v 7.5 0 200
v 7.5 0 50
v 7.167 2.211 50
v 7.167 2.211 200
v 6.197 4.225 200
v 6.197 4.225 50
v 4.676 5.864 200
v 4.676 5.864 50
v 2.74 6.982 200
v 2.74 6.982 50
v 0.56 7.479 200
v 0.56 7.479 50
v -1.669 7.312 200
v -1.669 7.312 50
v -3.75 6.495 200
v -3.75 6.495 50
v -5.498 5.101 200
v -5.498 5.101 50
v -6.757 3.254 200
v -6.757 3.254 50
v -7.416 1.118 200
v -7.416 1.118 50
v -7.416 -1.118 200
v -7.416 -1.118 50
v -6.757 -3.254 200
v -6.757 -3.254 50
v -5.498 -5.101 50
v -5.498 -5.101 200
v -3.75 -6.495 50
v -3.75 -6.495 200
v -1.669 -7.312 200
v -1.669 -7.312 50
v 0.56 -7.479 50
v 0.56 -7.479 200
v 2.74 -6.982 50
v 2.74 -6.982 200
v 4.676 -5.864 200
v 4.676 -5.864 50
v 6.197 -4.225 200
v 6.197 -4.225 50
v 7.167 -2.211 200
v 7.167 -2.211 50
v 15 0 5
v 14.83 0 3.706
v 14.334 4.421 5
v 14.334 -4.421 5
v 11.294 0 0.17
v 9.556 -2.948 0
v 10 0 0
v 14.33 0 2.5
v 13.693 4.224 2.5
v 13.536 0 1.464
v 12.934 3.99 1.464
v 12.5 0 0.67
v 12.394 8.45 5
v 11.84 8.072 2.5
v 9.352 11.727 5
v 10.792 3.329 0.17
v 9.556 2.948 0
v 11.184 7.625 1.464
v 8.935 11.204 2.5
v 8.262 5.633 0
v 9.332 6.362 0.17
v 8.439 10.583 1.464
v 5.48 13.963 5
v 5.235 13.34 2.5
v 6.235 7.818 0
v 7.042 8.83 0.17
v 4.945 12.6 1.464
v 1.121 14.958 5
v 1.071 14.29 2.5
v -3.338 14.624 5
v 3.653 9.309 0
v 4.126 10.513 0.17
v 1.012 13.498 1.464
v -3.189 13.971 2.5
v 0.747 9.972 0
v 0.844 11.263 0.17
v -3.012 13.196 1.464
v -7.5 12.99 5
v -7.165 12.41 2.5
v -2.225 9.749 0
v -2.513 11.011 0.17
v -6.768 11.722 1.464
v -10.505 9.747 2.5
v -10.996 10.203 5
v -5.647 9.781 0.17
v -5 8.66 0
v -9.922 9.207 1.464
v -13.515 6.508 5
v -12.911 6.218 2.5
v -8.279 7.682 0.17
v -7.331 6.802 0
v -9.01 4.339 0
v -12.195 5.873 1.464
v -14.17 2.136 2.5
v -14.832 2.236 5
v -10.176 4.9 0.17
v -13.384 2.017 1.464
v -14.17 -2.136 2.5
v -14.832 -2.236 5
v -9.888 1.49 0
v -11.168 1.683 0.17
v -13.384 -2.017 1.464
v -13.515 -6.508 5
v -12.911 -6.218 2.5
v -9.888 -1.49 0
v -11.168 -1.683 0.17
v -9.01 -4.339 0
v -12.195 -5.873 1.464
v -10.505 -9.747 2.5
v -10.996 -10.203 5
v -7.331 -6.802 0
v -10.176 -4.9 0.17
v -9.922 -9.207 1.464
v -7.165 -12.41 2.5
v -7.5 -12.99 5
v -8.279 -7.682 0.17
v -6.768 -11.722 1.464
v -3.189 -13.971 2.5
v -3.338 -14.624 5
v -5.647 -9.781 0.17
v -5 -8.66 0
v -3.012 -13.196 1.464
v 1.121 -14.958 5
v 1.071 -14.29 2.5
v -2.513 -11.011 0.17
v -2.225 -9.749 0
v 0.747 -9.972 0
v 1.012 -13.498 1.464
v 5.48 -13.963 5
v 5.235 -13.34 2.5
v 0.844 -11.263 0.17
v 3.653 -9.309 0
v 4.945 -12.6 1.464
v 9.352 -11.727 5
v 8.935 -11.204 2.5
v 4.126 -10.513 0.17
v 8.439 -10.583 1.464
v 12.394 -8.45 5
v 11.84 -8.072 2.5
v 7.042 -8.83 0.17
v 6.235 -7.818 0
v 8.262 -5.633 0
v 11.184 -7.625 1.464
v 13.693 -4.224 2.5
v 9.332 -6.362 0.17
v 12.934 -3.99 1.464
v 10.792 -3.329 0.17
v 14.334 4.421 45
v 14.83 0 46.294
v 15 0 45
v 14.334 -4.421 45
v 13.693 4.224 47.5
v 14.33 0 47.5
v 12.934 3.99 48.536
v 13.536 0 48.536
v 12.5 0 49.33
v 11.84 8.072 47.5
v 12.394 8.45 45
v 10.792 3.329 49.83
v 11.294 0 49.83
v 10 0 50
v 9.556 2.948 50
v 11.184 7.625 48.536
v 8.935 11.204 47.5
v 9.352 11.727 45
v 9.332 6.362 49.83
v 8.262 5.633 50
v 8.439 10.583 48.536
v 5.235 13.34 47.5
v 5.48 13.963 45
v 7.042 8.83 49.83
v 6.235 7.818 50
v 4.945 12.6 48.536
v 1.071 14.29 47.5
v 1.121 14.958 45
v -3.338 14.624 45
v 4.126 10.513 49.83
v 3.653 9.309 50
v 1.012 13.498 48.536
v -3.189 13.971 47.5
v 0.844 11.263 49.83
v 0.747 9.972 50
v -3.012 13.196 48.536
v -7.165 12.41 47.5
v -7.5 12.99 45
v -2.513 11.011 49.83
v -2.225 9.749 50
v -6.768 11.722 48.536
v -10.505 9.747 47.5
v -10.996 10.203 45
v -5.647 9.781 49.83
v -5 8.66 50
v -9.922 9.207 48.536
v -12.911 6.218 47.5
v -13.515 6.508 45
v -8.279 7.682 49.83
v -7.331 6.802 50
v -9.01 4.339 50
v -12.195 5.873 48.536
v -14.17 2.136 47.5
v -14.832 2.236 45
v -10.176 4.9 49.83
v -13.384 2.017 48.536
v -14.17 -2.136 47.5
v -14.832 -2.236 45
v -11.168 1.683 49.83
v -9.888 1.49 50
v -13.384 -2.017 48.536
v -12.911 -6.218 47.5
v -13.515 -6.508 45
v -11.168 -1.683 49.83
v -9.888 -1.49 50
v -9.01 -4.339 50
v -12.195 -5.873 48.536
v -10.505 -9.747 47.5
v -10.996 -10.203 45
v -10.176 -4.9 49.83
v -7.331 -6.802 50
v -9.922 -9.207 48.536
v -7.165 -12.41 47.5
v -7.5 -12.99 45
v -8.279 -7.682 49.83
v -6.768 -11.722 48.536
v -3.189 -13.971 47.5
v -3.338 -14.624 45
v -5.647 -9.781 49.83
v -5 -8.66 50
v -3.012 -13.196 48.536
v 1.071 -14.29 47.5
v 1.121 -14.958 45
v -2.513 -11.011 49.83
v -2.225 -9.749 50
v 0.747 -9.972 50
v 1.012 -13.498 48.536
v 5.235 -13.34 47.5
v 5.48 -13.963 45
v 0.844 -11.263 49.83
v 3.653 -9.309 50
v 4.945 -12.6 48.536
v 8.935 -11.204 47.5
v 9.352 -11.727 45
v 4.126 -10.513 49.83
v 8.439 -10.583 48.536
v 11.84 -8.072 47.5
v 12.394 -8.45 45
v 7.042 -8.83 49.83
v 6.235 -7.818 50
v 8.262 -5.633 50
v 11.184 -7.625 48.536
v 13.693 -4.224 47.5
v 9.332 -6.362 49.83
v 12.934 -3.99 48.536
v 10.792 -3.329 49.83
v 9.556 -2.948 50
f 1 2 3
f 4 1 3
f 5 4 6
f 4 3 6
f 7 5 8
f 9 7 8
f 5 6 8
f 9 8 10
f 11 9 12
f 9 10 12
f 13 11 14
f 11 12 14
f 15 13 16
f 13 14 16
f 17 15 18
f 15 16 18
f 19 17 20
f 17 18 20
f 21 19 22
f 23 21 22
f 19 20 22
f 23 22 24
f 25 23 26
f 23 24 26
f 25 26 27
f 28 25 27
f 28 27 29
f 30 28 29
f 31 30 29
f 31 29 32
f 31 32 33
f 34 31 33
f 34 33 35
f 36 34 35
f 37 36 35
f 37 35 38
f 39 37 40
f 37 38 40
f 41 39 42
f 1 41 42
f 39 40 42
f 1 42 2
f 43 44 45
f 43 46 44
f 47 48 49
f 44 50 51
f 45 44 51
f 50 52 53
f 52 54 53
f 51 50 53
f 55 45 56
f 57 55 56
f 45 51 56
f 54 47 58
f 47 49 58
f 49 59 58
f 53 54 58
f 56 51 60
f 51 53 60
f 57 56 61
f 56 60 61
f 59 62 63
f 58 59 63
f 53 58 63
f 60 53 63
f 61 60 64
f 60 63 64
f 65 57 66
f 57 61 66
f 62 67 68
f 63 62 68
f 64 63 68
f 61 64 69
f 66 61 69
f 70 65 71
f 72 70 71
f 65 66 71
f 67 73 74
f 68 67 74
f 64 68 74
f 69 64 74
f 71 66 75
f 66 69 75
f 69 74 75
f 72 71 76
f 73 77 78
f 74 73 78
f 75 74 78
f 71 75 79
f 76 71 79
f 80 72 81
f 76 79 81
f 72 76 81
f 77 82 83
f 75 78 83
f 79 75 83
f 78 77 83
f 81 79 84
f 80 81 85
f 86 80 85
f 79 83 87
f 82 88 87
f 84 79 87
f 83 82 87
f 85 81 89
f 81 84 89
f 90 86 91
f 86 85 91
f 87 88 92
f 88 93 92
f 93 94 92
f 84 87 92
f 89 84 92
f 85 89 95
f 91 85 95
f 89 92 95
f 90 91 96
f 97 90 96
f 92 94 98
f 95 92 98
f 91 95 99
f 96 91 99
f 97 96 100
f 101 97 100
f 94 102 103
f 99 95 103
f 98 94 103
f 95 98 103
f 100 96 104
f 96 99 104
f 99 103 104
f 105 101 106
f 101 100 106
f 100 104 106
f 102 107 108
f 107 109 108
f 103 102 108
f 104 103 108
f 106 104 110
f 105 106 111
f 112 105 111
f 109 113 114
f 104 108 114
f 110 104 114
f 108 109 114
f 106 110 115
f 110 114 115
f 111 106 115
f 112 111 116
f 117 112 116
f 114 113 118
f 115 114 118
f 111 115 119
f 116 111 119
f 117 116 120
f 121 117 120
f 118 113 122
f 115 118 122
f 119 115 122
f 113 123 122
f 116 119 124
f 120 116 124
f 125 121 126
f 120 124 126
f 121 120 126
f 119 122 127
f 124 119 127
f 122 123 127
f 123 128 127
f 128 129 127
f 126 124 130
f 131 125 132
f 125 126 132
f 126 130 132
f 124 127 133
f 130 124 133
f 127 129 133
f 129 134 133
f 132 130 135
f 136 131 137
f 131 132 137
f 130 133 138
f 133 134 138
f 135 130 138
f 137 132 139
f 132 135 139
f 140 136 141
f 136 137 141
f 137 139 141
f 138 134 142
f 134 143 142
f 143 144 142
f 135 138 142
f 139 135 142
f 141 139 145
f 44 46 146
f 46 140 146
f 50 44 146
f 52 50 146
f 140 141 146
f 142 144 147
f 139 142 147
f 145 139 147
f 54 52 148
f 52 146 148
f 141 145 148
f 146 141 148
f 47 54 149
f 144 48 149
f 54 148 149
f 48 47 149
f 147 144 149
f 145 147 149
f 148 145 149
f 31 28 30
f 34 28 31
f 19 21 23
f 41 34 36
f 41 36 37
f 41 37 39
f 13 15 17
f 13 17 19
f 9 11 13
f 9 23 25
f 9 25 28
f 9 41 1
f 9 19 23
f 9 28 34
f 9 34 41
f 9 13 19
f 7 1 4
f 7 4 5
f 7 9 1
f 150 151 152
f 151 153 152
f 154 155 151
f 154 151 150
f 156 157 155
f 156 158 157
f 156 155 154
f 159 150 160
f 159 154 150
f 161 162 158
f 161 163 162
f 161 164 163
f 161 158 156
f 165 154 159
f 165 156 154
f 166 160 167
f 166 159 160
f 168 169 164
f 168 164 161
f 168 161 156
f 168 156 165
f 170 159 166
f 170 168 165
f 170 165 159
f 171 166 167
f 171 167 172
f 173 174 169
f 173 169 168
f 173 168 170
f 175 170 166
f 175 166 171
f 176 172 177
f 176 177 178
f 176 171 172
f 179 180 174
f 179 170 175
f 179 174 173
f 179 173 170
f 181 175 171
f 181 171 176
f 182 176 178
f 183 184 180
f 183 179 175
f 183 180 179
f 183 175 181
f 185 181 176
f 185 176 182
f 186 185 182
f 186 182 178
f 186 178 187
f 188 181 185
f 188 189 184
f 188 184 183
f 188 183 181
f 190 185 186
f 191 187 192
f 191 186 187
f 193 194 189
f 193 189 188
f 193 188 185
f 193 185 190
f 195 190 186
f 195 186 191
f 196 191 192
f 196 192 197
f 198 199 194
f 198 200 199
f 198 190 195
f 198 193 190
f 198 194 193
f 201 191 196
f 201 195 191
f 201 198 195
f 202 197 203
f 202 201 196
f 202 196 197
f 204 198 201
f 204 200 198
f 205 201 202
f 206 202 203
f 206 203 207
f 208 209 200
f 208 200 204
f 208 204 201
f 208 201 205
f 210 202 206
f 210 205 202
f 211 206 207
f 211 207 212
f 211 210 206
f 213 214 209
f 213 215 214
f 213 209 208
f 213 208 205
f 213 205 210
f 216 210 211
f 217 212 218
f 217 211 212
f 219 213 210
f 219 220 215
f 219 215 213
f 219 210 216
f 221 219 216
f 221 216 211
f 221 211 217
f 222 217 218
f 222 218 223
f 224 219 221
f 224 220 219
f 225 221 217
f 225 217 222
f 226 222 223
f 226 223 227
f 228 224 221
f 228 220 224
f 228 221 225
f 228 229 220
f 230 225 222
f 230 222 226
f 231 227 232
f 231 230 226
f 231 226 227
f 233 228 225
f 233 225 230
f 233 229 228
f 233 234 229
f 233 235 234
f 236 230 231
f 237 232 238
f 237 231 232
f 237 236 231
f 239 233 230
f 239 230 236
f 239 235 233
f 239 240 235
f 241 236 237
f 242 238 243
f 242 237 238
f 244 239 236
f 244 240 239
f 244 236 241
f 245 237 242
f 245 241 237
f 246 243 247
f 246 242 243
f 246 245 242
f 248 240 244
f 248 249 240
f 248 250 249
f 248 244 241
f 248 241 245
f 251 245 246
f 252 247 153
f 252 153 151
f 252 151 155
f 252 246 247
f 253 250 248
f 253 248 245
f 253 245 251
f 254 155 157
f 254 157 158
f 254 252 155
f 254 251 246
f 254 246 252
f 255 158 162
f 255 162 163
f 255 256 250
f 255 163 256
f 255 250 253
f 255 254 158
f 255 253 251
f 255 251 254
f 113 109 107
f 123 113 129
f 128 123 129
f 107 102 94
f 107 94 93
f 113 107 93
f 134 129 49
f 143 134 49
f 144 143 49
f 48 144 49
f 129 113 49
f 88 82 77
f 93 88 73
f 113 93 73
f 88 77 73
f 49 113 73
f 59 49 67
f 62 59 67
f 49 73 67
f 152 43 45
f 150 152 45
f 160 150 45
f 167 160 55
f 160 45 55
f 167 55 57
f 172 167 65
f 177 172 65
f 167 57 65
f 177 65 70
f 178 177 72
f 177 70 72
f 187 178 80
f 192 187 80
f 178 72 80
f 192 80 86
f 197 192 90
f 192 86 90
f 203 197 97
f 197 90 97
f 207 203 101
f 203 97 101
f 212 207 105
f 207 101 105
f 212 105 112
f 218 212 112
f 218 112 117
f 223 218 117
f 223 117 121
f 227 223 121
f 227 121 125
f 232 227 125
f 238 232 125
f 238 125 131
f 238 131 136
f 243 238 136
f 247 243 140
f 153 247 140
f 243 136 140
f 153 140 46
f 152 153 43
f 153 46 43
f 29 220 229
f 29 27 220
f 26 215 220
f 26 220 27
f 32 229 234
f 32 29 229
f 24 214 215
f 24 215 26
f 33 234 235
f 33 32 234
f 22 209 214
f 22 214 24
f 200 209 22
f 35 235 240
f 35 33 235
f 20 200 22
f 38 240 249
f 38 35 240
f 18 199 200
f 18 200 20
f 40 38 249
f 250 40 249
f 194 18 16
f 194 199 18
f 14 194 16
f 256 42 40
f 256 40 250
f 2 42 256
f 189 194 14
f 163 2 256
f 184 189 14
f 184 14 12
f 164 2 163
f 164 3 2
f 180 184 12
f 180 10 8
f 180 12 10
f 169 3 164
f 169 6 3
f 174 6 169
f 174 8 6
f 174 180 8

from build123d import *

# Parameters (mm, degrees)
F0_R     = 15
F1_DEPTH = 50
F2_R     = 5
F3_R     = 7.5
F4_DEPTH = 150


with BuildPart() as f1:
    # F0 (on Top) → F1 (new body)
    with BuildSketch(Plane.XY):
        Circle(F0_R)
    extrude(amount=F1_DEPTH)

    # F2
    f2_edges = [f1.edges().sort_by_distance(p)[0] for p in [
        (-15, 0, 50),
        (-15, 0, 0),
    ]]
    fillet(f2_edges, radius=F2_R)

    # F3 (on face) → F4 (join)
    with BuildSketch(Plane.XY.offset(50)):
        Circle(F3_R)
    extrude(amount=F4_DEPTH)


solid = f1.part
